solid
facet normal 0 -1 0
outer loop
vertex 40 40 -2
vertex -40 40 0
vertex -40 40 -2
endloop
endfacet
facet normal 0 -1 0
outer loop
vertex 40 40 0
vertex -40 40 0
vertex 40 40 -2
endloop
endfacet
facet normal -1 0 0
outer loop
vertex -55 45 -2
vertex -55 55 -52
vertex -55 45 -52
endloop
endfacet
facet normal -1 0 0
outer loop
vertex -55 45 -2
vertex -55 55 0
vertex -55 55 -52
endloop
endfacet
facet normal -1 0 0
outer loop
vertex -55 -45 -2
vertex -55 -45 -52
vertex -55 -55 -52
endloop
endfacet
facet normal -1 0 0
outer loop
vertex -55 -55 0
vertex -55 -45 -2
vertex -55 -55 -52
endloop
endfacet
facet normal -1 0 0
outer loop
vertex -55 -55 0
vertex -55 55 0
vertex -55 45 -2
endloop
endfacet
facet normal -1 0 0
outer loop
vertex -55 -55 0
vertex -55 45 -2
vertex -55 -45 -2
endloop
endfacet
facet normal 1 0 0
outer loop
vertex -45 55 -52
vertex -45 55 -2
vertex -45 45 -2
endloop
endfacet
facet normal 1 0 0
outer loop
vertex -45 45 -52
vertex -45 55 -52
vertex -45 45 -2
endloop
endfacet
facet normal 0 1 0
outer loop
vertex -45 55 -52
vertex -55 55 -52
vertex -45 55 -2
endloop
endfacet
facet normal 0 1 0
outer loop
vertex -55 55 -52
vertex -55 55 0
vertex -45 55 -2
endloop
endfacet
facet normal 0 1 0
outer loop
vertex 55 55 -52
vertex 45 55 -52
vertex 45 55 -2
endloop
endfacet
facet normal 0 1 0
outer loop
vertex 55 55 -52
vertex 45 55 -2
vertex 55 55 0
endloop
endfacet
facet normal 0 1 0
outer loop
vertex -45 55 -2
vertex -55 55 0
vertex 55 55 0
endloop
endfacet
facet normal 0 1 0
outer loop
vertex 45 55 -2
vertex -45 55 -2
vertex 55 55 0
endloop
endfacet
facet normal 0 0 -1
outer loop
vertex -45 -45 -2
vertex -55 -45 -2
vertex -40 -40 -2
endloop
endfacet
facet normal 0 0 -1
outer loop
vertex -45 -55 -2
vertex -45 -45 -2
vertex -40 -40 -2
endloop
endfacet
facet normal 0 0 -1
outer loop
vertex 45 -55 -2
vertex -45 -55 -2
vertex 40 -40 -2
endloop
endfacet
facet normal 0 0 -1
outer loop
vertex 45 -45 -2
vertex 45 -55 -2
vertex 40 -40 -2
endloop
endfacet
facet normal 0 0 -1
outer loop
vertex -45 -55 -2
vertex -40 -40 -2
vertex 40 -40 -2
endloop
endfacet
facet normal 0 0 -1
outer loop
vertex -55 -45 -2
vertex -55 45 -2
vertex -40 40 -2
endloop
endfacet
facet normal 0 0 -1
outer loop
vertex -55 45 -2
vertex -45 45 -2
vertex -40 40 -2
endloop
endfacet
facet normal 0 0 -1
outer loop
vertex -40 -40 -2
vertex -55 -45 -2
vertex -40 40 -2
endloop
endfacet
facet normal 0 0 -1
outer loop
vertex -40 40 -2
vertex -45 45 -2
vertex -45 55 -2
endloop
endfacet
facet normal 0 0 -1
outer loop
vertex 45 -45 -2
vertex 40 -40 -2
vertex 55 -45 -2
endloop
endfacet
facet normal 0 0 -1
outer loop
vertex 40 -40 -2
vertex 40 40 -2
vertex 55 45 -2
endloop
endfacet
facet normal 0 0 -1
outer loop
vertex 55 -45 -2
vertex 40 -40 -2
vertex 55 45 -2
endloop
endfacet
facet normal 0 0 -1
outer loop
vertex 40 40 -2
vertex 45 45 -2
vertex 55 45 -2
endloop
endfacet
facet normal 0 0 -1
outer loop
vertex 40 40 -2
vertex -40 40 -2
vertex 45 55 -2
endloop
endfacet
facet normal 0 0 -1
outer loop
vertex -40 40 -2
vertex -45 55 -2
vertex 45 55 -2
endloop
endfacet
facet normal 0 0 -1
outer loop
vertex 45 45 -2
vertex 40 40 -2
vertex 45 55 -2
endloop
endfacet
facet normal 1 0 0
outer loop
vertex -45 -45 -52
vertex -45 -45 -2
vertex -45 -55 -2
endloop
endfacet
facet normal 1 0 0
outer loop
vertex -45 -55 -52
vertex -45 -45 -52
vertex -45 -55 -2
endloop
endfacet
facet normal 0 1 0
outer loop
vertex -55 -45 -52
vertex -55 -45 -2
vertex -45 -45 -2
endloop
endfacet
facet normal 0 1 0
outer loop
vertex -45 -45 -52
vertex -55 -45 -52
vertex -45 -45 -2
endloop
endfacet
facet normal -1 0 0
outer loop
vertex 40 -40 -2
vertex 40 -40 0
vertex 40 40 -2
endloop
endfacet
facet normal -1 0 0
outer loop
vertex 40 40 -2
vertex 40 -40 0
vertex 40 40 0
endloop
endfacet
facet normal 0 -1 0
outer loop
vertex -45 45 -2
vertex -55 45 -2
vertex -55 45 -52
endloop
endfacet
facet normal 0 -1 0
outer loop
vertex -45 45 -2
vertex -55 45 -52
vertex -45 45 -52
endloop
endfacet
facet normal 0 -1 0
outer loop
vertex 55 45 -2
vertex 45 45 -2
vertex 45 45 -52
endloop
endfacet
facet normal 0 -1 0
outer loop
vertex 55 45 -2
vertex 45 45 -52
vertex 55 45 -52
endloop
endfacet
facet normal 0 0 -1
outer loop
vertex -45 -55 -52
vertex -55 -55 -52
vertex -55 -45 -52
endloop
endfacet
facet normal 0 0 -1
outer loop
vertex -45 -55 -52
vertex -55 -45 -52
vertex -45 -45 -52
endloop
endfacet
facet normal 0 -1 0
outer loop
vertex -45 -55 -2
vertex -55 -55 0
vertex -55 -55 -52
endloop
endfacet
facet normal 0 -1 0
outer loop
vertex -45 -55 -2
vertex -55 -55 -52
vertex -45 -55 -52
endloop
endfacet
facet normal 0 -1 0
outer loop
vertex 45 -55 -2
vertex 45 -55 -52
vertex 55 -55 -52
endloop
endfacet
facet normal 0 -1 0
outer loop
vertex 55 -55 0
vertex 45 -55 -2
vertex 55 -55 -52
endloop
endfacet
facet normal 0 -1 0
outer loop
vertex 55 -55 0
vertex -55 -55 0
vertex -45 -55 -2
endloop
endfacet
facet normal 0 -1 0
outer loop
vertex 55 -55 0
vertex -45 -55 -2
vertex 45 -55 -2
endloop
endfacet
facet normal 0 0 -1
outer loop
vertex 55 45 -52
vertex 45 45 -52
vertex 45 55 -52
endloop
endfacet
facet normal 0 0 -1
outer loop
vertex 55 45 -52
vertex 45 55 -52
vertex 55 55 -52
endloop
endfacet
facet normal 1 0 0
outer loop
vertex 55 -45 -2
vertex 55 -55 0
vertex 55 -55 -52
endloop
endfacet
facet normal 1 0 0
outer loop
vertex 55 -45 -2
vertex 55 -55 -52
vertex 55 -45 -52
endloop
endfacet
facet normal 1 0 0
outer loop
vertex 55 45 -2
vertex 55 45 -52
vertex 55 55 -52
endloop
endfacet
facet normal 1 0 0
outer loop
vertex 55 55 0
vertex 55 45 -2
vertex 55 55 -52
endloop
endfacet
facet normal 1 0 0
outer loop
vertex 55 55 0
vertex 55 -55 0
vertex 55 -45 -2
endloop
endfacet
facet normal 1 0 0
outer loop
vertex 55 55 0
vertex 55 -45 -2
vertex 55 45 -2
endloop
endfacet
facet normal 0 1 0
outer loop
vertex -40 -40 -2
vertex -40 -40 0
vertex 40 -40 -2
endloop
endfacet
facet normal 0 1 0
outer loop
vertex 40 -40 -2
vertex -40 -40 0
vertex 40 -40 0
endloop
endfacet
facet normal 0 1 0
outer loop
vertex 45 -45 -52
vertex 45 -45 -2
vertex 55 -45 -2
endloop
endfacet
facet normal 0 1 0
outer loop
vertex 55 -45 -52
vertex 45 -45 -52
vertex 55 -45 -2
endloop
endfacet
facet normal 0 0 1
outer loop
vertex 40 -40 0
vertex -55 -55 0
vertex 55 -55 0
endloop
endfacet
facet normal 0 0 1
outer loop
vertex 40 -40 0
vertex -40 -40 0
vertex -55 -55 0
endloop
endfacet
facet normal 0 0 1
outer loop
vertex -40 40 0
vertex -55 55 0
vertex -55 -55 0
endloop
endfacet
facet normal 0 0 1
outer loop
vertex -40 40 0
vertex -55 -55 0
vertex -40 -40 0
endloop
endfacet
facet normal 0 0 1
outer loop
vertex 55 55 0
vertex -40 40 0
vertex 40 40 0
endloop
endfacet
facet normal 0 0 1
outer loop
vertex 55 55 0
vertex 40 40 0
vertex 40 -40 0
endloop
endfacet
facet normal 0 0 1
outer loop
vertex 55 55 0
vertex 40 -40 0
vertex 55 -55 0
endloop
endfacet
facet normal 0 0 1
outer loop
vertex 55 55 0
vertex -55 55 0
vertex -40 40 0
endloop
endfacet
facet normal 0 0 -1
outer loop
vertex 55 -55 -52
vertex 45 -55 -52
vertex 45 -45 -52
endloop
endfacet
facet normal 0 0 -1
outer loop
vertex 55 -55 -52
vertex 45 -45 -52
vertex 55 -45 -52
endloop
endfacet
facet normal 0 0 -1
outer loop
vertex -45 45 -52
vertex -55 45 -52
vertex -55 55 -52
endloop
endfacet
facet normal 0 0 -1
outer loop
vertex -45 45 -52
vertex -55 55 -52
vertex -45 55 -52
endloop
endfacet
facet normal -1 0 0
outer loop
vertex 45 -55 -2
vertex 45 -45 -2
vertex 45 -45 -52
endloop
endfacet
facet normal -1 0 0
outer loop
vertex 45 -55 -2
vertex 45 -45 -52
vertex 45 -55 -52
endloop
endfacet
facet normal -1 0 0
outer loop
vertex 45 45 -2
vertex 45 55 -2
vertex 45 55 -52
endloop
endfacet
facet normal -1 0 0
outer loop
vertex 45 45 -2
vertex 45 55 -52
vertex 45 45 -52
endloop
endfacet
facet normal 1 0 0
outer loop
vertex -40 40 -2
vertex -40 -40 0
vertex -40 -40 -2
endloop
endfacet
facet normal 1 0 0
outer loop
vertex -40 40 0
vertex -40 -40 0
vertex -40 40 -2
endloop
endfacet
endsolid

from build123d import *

# Parameters (mm, degrees)
F0_W     = 110
F0_H     = 110
F1_DEPTH = 2
F2_W     = 10
F2_H     = 10
F3_DEPTH = 50
F4_W     = 80
F4_H     = 80
F5_DEPTH = 52.001


with BuildPart() as f1:
    # F0 (on Top) → F1 (new body)
    with BuildSketch(Plane.XY):
        Rectangle(F0_W, F0_H)
    extrude(amount=-F1_DEPTH)

    # F2 (on face) → F3 (join)
    with BuildSketch(Plane(origin=(0, 0, -2), x_dir=(1, 0, 0), z_dir=(0, 0, -1))):
        with Locations((-50, -50)):
            Rectangle(F2_W, F2_H)
        with Locations((-50, 50)):
            Rectangle(F2_W, F2_H)
        with Locations((50, 50)):
            Rectangle(F2_W, F2_H)
        with Locations((50, -50)):
            Rectangle(F2_W, F2_H)
    extrude(amount=F3_DEPTH)

    # F4 (on face) → F5 (cut, through all)
    with BuildSketch(Plane.XY):
        Rectangle(F4_W, F4_H)
    extrude(amount=-F5_DEPTH, mode=Mode.SUBTRACT)


solid = f1.part
